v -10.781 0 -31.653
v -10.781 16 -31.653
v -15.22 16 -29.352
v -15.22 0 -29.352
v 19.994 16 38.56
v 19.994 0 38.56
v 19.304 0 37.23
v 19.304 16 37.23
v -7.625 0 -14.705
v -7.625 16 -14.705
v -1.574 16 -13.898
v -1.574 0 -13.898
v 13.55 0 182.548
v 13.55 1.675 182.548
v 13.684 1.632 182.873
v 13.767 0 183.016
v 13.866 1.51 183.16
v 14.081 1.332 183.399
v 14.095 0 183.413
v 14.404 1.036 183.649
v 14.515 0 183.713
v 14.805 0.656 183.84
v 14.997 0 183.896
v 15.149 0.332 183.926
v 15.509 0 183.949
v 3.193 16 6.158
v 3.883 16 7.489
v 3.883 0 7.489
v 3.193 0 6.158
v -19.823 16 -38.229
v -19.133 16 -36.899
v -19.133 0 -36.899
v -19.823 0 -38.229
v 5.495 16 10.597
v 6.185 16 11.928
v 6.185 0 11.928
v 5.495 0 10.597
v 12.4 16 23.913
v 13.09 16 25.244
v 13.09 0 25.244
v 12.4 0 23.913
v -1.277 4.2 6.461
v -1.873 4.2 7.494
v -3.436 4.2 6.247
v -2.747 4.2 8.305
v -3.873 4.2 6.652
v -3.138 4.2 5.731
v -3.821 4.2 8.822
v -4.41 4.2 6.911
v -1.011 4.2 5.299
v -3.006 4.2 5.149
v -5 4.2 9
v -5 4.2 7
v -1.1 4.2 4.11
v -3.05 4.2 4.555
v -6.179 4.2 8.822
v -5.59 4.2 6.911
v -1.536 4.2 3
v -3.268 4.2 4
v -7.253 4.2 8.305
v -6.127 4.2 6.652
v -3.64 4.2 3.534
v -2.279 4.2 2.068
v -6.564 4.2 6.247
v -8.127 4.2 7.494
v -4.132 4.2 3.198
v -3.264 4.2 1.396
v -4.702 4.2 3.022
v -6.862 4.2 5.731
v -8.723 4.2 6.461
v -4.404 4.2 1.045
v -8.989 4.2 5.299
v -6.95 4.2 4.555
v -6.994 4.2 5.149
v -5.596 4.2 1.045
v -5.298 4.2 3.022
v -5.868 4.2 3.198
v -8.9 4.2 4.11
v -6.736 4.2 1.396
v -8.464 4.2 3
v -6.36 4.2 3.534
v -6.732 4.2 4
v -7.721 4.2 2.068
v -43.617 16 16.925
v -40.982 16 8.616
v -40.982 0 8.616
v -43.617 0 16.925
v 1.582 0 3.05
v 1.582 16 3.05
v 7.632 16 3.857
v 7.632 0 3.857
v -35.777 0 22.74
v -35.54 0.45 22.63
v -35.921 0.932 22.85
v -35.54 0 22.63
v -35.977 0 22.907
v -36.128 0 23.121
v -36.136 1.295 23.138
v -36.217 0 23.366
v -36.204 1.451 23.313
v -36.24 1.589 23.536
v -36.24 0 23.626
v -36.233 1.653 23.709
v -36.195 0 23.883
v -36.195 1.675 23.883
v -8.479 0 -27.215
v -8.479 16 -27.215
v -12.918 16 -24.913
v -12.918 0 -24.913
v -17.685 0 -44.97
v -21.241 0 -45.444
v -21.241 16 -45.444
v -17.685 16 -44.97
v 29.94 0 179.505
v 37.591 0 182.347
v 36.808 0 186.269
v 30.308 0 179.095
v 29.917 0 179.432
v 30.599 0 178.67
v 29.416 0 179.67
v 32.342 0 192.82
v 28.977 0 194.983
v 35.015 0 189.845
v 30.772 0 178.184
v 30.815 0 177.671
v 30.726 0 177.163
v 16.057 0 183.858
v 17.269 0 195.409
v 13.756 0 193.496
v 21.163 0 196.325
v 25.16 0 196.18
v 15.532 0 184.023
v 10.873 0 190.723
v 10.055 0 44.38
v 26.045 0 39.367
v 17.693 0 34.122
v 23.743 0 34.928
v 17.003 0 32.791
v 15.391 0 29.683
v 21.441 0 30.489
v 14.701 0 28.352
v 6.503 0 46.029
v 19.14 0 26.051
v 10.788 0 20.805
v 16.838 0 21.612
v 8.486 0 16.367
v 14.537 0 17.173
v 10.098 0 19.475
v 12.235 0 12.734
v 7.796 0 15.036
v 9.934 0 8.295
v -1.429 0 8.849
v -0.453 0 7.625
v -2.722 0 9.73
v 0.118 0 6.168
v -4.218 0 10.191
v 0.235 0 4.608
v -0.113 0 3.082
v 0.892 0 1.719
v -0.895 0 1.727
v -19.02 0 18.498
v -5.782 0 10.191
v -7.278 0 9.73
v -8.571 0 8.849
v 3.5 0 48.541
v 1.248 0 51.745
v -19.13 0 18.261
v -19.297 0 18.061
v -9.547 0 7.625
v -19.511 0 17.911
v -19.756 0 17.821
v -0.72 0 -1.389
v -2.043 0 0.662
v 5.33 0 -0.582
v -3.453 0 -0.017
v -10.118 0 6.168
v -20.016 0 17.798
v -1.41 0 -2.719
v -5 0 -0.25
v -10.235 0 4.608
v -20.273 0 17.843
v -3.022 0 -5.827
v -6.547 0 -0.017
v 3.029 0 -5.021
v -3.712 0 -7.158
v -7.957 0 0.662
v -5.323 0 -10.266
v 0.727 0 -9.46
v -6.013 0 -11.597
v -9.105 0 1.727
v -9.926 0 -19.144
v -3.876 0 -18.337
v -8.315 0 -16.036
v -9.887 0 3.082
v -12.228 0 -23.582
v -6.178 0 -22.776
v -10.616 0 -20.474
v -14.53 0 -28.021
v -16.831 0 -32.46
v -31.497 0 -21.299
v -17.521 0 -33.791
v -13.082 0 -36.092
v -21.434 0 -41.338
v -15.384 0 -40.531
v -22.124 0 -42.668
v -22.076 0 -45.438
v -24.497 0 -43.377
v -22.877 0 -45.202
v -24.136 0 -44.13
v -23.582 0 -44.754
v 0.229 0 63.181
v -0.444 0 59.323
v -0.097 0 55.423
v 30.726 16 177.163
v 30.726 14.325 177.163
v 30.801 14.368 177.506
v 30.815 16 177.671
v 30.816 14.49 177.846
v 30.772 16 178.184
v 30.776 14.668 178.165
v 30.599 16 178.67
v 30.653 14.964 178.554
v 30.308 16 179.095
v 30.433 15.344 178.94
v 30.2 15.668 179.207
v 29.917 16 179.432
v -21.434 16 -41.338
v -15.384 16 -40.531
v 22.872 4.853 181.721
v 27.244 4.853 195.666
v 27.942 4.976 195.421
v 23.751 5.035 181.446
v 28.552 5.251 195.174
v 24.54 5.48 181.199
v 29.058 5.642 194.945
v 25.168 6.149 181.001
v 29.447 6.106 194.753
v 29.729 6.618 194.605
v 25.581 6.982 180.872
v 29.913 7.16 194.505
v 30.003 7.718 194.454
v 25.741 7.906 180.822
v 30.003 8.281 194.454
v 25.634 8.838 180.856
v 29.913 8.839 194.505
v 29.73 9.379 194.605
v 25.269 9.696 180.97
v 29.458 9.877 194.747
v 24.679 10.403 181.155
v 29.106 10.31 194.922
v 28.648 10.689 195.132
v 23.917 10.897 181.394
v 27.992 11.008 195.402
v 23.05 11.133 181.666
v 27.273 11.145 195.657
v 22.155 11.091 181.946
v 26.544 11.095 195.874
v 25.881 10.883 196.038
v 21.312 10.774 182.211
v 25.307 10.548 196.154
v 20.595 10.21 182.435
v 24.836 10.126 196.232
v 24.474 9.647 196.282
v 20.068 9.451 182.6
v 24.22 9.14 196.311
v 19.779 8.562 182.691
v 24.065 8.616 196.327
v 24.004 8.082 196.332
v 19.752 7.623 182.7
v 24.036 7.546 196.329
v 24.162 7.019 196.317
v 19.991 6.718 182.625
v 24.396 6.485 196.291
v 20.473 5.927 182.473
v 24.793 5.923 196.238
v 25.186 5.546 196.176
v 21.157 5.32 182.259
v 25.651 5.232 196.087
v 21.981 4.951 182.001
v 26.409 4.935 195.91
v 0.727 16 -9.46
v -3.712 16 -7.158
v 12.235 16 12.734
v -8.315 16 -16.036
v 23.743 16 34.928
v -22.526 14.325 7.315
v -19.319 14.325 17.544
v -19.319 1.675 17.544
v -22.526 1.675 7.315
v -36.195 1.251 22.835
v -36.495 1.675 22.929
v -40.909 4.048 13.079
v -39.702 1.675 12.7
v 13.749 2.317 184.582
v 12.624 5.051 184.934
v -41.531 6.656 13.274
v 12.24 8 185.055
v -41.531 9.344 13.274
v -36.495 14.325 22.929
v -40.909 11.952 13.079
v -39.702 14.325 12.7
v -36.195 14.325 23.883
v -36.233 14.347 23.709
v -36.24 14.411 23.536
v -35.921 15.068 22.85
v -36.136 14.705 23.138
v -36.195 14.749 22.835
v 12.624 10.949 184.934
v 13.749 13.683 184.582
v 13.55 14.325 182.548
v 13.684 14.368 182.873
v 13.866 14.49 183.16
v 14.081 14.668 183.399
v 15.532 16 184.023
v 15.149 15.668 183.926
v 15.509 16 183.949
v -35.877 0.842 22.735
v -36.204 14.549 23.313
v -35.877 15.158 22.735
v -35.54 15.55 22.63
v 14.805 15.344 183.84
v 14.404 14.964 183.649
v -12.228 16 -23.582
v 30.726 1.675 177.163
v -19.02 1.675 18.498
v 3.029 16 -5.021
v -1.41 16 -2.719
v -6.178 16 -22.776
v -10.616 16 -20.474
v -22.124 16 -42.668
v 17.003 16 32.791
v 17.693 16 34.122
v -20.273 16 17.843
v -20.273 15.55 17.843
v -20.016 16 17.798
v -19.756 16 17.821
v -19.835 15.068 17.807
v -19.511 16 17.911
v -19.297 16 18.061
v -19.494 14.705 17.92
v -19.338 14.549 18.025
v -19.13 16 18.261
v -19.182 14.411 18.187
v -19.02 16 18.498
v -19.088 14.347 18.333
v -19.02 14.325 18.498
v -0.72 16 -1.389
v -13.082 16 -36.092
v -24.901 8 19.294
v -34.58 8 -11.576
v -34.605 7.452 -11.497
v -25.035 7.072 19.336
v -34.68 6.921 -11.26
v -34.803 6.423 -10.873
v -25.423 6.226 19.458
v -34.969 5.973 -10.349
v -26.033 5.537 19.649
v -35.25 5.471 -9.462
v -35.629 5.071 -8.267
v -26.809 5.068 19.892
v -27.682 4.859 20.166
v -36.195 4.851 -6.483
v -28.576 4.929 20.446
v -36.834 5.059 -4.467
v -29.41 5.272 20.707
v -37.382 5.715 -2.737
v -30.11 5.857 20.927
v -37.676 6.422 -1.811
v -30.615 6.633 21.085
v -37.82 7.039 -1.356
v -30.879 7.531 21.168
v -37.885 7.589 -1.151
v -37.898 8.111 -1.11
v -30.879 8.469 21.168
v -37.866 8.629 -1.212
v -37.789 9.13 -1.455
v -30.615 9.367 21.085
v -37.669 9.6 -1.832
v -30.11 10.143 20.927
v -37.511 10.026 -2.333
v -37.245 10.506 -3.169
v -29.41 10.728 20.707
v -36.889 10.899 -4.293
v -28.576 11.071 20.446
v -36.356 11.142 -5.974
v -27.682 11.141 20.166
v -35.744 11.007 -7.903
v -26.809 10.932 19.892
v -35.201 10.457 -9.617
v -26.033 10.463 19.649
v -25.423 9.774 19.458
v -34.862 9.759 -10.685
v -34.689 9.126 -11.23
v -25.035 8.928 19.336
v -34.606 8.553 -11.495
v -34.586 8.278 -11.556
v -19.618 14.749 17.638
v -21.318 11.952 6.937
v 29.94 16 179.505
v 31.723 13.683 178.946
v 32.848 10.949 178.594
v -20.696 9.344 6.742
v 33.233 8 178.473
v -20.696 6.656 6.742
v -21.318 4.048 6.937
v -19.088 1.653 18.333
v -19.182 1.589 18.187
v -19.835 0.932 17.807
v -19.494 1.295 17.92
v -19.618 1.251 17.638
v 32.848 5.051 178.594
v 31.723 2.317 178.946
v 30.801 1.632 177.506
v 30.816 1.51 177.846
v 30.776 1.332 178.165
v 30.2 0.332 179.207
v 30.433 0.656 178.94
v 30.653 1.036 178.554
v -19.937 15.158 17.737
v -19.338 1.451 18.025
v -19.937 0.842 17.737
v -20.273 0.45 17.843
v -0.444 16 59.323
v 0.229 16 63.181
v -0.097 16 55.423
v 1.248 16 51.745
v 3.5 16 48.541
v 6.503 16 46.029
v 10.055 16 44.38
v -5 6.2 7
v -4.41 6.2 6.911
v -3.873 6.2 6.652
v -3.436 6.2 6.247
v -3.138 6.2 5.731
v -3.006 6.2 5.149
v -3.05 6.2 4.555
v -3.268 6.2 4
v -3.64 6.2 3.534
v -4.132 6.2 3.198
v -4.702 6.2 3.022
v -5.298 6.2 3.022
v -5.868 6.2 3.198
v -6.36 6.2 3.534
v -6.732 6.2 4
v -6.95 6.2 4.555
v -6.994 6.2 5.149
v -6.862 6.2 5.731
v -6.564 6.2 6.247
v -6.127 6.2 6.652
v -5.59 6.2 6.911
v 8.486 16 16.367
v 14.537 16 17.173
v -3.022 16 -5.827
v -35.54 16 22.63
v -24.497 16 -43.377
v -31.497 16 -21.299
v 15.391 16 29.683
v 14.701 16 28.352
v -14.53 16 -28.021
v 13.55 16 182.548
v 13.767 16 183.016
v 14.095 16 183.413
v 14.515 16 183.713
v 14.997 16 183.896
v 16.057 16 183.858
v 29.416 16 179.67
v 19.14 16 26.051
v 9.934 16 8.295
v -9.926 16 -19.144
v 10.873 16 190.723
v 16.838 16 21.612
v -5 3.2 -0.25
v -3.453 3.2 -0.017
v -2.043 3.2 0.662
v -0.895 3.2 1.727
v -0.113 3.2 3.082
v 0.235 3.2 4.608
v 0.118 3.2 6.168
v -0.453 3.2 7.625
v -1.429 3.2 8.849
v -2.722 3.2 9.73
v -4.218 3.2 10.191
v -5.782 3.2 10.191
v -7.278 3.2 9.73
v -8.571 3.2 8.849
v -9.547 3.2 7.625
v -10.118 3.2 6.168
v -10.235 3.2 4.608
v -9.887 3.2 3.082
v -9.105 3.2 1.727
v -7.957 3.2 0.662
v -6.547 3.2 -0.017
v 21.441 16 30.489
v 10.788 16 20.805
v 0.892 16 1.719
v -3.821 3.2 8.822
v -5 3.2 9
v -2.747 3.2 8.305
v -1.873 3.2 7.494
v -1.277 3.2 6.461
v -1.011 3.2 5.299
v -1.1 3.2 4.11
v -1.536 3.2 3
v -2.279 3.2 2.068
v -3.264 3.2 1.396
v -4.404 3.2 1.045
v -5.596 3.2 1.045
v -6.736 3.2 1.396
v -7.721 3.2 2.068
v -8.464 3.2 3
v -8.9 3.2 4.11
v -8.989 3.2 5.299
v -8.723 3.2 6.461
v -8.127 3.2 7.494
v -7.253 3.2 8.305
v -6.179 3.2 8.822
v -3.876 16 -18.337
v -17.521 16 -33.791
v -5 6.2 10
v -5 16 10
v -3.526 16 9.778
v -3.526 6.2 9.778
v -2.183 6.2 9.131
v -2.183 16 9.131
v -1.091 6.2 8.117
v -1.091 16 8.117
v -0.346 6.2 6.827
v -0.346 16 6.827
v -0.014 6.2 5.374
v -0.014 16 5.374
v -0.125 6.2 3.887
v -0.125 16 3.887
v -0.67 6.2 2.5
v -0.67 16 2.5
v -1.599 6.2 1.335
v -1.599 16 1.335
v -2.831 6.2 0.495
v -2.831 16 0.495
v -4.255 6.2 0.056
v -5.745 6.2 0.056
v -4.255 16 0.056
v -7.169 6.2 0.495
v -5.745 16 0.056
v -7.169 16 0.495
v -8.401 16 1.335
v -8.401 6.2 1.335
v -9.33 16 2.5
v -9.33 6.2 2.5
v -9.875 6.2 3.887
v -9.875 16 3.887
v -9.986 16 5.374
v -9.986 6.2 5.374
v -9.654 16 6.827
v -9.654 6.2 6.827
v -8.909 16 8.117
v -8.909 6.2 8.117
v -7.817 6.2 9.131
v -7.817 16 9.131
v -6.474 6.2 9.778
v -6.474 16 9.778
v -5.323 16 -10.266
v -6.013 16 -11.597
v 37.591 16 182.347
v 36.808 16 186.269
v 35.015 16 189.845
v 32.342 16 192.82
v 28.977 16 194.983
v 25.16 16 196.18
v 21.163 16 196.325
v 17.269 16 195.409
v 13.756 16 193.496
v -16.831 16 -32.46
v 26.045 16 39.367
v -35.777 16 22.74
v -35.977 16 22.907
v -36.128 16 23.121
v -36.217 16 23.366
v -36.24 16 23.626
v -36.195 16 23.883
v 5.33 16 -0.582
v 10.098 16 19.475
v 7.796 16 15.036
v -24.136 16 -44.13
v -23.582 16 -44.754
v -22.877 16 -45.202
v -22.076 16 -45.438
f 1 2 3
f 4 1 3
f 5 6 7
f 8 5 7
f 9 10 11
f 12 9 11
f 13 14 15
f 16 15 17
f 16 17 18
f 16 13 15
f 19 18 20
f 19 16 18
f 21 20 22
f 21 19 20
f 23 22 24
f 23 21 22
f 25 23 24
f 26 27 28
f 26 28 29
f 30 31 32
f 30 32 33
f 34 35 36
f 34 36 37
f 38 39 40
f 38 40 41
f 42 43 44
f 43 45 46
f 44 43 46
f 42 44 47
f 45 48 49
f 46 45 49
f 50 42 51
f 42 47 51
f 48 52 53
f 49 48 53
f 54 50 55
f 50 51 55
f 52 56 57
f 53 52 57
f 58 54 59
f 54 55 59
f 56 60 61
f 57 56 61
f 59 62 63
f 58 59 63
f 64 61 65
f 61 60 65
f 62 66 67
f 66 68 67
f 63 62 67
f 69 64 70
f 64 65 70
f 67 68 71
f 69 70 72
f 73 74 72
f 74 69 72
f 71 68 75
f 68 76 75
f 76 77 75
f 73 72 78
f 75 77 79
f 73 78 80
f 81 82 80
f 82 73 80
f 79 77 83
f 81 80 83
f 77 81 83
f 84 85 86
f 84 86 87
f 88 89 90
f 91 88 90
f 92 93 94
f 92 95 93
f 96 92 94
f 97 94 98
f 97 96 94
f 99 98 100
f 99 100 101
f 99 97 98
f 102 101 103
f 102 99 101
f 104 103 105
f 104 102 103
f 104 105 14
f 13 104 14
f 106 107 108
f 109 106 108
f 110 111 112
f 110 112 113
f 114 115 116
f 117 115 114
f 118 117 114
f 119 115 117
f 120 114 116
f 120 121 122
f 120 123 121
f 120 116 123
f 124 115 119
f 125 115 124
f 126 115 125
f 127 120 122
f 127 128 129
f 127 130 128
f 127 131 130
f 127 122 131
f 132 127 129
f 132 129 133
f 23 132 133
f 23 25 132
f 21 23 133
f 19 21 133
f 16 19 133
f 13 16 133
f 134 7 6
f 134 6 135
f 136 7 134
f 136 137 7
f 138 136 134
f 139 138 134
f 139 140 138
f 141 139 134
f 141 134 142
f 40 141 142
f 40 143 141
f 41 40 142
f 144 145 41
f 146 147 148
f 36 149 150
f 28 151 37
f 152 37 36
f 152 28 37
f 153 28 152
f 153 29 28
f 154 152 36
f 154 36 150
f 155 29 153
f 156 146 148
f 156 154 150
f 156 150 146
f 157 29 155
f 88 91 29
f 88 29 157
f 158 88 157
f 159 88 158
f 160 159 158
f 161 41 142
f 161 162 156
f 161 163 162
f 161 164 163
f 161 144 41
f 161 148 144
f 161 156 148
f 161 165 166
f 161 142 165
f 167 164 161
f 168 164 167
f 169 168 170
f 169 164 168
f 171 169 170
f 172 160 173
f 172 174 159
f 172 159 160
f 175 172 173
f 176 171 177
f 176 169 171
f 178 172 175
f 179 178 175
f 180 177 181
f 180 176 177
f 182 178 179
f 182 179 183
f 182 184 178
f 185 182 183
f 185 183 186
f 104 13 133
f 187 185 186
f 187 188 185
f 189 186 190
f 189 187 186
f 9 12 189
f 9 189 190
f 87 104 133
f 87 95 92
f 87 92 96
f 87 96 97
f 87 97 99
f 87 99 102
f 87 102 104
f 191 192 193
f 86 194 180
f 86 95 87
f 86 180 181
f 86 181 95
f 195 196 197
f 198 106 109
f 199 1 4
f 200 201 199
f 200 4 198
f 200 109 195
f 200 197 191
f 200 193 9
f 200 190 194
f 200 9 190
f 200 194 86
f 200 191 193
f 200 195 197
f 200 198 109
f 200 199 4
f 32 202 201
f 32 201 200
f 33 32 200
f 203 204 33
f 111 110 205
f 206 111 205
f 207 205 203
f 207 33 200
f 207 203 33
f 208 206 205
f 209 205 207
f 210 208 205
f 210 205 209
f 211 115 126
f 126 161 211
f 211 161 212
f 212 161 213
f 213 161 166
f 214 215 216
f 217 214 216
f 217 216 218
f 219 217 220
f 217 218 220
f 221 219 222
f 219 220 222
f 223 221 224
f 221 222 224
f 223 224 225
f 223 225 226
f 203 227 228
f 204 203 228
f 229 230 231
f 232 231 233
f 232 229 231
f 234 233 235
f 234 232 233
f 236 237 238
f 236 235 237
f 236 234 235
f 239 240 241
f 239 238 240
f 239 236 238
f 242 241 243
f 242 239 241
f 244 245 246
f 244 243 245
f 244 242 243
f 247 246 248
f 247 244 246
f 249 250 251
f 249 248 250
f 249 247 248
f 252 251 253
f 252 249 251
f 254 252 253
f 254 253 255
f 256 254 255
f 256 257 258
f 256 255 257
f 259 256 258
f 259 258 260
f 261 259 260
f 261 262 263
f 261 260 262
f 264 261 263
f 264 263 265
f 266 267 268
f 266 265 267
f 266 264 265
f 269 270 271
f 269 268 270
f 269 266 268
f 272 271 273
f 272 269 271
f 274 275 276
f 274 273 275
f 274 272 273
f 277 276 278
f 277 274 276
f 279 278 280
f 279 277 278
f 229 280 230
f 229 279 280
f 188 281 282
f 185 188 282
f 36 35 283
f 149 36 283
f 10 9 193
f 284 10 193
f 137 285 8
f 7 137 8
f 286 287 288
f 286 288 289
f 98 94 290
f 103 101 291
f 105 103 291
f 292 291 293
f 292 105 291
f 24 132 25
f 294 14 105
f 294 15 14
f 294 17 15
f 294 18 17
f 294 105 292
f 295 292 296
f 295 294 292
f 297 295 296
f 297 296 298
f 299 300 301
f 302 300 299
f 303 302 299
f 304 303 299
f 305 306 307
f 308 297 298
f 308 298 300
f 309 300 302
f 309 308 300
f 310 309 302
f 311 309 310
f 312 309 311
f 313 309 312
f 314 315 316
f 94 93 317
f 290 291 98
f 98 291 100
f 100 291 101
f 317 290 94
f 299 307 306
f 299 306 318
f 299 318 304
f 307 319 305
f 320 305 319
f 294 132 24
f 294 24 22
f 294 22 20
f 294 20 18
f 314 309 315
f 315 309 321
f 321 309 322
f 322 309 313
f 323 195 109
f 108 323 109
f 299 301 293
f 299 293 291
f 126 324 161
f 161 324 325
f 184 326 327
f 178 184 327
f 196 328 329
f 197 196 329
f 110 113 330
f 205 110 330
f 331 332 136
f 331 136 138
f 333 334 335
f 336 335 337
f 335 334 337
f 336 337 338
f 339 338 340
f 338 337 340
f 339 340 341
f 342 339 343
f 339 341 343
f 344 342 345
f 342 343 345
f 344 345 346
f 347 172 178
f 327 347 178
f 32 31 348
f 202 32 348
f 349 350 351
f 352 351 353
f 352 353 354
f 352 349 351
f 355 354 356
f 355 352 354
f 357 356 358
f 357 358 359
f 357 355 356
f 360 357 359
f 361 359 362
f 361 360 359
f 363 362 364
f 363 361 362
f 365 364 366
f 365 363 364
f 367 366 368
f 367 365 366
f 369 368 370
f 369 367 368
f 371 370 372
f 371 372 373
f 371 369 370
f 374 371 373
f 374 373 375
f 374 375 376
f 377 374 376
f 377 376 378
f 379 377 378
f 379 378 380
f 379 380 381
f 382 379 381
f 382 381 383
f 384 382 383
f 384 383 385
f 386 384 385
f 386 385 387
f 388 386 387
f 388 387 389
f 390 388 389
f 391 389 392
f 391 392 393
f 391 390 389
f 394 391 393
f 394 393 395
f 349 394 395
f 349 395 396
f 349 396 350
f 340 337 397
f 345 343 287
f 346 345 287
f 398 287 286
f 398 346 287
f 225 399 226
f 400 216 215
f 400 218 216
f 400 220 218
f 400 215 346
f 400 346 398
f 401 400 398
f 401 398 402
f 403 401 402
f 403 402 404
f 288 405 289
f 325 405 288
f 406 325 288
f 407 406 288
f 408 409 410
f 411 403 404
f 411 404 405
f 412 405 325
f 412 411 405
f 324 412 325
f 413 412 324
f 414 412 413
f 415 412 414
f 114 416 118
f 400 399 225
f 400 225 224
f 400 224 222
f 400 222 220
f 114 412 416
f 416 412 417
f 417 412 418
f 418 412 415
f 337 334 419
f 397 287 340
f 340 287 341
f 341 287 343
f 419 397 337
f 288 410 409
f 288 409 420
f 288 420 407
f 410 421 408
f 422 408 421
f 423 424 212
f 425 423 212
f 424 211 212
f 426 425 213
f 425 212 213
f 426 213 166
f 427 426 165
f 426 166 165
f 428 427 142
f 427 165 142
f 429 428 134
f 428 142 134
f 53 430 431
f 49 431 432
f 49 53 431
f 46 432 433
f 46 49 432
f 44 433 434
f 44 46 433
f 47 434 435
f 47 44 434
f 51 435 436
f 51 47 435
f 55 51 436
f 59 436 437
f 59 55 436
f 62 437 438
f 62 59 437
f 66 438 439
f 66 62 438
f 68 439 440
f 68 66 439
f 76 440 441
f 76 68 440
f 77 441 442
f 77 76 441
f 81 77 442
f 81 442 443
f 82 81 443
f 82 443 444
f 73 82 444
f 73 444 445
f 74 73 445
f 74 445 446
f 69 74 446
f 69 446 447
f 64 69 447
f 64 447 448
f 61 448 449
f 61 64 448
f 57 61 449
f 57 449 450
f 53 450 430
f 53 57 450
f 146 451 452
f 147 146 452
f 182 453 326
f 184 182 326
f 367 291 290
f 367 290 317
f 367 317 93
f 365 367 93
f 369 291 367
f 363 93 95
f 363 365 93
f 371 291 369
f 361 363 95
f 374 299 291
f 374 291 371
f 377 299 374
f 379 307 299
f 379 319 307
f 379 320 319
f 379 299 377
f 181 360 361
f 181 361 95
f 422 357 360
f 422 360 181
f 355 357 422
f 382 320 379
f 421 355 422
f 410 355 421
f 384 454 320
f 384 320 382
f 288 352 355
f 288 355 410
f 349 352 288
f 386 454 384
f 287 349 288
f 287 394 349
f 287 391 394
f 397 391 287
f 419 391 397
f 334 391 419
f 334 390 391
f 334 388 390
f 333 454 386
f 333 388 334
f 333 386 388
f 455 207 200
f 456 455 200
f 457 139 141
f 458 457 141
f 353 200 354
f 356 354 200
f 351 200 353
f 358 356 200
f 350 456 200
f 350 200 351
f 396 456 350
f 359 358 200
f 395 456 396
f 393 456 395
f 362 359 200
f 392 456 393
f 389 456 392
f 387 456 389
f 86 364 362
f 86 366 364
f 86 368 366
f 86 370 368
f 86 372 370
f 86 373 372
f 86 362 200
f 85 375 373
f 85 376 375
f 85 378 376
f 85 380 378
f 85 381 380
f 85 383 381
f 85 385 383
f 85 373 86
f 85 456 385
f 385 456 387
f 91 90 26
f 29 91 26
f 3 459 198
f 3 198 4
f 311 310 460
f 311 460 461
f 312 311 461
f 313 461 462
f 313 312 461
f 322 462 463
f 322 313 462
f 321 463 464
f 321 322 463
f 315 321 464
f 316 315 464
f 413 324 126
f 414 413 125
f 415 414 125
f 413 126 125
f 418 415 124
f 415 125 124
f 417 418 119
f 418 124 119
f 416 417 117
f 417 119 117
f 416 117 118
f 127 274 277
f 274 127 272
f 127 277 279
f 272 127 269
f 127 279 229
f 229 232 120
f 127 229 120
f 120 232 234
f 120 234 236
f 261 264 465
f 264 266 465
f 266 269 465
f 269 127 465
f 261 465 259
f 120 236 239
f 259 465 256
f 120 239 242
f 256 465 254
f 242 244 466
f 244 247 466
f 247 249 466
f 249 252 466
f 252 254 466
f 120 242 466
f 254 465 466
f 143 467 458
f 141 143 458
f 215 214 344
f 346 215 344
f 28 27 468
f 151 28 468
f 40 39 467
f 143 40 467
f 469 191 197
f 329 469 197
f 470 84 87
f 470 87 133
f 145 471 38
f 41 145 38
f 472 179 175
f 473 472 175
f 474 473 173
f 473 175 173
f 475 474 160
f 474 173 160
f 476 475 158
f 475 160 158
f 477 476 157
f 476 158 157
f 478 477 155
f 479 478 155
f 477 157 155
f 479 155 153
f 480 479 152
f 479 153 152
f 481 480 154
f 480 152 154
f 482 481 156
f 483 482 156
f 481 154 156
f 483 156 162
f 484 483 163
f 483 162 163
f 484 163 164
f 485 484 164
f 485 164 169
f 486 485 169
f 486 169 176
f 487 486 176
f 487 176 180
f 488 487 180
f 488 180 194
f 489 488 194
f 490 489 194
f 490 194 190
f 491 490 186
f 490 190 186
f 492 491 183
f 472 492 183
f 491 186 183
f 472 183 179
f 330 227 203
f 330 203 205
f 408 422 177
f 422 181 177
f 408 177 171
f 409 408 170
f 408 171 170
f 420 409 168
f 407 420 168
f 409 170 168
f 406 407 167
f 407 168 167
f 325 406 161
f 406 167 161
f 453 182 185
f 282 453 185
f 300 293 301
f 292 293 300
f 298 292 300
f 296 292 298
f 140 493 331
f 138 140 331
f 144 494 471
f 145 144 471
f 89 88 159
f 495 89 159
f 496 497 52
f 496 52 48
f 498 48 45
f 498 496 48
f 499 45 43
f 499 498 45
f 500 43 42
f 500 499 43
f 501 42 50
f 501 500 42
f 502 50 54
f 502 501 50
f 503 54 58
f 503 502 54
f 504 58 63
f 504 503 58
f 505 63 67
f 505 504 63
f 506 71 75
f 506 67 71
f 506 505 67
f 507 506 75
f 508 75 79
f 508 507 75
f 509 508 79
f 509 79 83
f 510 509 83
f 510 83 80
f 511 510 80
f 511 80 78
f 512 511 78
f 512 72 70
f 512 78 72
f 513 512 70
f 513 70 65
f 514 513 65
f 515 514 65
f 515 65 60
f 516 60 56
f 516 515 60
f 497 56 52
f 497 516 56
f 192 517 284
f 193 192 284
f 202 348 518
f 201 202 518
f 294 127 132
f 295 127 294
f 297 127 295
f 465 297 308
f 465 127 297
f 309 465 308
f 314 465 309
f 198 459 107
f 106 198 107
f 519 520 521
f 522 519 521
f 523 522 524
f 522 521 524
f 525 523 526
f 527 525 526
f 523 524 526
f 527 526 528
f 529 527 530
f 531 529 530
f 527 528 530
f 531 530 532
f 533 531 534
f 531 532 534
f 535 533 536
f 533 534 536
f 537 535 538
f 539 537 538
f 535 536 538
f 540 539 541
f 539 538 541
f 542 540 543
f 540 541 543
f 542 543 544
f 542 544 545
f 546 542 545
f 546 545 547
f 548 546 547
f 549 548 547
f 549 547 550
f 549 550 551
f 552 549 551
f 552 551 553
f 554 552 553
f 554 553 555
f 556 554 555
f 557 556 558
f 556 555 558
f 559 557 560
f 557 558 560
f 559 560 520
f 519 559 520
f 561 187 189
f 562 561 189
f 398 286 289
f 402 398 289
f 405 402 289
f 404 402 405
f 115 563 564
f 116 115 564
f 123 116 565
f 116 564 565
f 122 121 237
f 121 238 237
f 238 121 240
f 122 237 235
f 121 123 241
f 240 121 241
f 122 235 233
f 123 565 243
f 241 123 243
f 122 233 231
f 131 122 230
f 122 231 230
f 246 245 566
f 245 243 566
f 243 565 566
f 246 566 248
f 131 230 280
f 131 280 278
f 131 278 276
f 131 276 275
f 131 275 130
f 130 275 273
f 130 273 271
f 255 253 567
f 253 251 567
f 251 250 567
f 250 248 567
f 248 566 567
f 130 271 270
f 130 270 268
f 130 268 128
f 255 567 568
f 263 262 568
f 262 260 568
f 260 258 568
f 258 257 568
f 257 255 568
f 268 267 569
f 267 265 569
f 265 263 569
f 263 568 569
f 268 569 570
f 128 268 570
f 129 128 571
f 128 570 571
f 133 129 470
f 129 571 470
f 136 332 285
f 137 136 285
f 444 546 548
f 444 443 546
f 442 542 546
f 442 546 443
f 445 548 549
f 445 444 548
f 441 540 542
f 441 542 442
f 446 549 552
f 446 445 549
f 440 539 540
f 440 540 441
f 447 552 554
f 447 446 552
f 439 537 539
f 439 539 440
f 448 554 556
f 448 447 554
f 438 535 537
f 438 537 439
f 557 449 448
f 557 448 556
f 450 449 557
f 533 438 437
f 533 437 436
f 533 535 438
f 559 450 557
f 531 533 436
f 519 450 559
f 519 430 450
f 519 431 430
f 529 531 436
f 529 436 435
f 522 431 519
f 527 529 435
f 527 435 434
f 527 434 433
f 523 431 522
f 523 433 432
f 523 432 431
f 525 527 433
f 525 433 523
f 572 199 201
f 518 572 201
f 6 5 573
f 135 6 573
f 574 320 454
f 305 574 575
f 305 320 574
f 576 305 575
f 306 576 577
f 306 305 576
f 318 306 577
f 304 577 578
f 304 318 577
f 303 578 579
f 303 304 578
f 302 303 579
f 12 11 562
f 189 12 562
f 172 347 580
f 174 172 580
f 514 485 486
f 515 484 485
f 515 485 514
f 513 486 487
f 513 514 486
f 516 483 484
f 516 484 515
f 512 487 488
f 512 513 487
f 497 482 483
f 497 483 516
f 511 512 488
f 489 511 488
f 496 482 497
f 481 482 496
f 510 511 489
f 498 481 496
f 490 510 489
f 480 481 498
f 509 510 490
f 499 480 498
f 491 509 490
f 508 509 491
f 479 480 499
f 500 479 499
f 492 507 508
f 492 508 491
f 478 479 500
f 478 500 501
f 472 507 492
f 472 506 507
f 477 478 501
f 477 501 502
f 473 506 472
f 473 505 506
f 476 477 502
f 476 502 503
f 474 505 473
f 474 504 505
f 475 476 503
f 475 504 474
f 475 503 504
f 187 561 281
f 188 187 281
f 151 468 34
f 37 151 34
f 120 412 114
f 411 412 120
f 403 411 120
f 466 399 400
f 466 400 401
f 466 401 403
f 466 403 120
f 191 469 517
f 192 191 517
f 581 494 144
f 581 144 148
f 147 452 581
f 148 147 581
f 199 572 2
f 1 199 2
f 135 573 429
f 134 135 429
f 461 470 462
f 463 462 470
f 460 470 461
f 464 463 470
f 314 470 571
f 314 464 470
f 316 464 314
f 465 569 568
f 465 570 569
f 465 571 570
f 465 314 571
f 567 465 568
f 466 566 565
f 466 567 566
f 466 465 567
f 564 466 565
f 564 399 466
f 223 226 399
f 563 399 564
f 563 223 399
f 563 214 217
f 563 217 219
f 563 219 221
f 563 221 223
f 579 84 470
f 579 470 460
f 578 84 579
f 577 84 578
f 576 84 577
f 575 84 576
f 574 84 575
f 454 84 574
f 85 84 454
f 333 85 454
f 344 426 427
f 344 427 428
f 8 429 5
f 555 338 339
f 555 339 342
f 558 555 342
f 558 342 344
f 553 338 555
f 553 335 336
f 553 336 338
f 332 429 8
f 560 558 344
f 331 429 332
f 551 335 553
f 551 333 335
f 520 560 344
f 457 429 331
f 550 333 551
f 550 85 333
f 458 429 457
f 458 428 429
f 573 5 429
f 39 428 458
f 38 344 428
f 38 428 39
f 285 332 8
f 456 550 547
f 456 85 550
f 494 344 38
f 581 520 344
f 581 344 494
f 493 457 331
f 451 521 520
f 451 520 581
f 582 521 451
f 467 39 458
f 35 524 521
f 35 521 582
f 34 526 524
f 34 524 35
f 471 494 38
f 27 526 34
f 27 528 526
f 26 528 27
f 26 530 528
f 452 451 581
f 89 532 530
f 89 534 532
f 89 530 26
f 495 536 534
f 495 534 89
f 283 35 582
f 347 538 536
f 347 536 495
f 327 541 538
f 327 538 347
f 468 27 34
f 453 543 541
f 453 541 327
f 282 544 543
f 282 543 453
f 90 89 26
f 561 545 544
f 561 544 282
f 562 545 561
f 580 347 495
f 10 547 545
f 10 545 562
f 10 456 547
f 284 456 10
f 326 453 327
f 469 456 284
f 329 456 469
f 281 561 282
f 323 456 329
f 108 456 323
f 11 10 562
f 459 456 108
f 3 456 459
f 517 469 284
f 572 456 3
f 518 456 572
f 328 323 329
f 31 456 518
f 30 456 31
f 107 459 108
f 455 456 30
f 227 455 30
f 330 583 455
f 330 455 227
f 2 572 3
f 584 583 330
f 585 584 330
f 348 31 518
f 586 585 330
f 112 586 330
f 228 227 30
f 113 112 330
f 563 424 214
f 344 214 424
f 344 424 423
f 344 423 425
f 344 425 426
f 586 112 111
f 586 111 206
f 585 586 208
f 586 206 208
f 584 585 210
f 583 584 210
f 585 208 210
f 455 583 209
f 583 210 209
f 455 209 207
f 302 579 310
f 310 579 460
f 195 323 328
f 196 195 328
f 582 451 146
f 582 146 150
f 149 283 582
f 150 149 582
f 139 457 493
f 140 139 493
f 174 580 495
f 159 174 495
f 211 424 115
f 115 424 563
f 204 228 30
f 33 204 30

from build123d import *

# Parameters (mm, degrees)
SKETCH1_R                = 4
BOSS_EXTRUDE1_DEPTH      = 16
CUT_EXTRUDE2_DEPTH       = 243.712011885
FILLET2_R                = 50
FILLET3_R                = 5
BOSS_EXTRUDE2_DEPTH      = 16
LPATTERN1_COUNT          = 58
LPATTERN1_PITCH          = 5
SKETCH6_R                = 5.25
CUT_EXTRUDE4_DEPTH       = 3.2
BOSS_EXTRUDE3_START      = -11.8
SKETCH8_R                = 4
SKETCH8_R_2              = 2
BOSS_EXTRUDE3_DEPTH      = 11.8
SKETCH9_R                = 5
CUT_EXTRUDE7_DEPTH       = 9.8
BOSS_EXTRUDE4_DEPTH      = 16
CUT_EXTRUDE8_DEPTH       = 330.19878797
CUT_EXTRUDE8_DEPTH_BACK  = 330.19878797
SKETCH10_R               = 3.15
CUT_EXTRUDE9_DEPTH       = 230.693221824
CUT_EXTRUDE10_DEPTH      = 230.693221824
CUT_EXTRUDE13_DEPTH      = 228.62792195
FILLET6_R                = 15
FILLET7_R                = 2
SKETCH18_R               = 11
CUT_EXTRUDE14_DEPTH      = 180
CUT_EXTRUDE15_DEPTH      = 211.145198264
CUT_EXTRUDE15_DEPTH_BACK = 211.145198264
BOSS_EXTRUDE5_REACH      = 203.817
FILLET8_R                = 1
FILLET9_R                = 3
CUT_EXTRUDE16_DEPTH      = 239.866298177
CUT_EXTRUDE16_DEPTH_BACK = 239.866298177
SKETCH21_R               = 3.15


with BuildPart() as part:
    # Sketch1 → Boss-Extrude1 (new body)
    with BuildSketch(Plane(origin=(0, 0, 0), x_dir=(1, 0, 0), z_dir=(0, 1, 0))):
        Polygon((0, 0), (-70, 135), (-70, -15), (-70, -215), (111.481481481, -215), align=None)
        with Locations(Location((-5, -5, 0), (0, 0, 270))):
            Circle(SKETCH1_R, mode=Mode.SUBTRACT)
    extrude(amount=BOSS_EXTRUDE1_DEPTH)

    # Sketch3 → Cut-Extrude2 (cut, through all)
    with BuildSketch(Plane(origin=(0, 16, 0), x_dir=(1, 0, 0), z_dir=(0, 1, 0))):
        Polygon((-52.442610269, 88.104828667), (-69.618224346, 82.719823463), (14.148523277, -184.456395525), (31.324137355, -179.07139032), align=None)
    extrude(amount=-CUT_EXTRUDE2_DEPTH, mode=Mode.SUBTRACT)

    # Fillet2
    fillet2_edges = [part.edges().sort_by_distance(p)[0] for p in [
        (111.481481481, 8, 215),
        (-70, 8, 215),
    ]]
    fillet(fillet2_edges, radius=FILLET2_R)

    # Fillet3
    fillet3_edges = [part.edges().sort_by_distance(p)[0] for p in [
        (-70, 8, -135),
    ]]
    fillet(fillet3_edges, radius=FILLET3_R)

    # Sketch4 → Boss-Extrude2 (add)
    with BuildSketch(Plane(origin=(0, 16, 0), x_dir=(1, 0, 0), z_dir=(0, 1, 0))):
        Polygon((-60.561227343, 116.796652732), (-54.510866943, 115.99017648), (-58.9496396, 113.688590657), align=None)
    boss_extrude2 = extrude(amount=-BOSS_EXTRUDE2_DEPTH)

    # LPattern1: Boss-Extrude2 ×58
    with Locations(*[Vector(0.46031716445500054, 0, 0.8877545314489294) * (i * LPATTERN1_PITCH) for i in range(1, LPATTERN1_COUNT)]):
        add(boss_extrude2)

    # Sketch6 → Cut-Extrude4 (cut)
    with BuildSketch(Plane.XZ):
        with Locations(Location((-5, 5, 0), (0, 0, 270))):
            Circle(SKETCH6_R)
    extrude(amount=-CUT_EXTRUDE4_DEPTH, mode=Mode.SUBTRACT)

    # Sketch8 → Boss-Extrude3 (add)
    with BuildSketch(Plane(origin=(0, 16, 0), x_dir=(1, 0, 0), z_dir=(0, 1, 0)).offset(BOSS_EXTRUDE3_START)):
        with Locations(Location((-5, -5, 0), (0, 0, 90))):
            Circle(SKETCH8_R)
        with Locations(Location((-5, -5, 0), (0, 0, 270))):
            Circle(SKETCH8_R_2, mode=Mode.SUBTRACT)
    extrude(amount=BOSS_EXTRUDE3_DEPTH)

    # Sketch9 → Cut-Extrude7 (cut)
    with BuildSketch(Plane(origin=(0, 16, 0), x_dir=(1, 0, 0), z_dir=(0, 1, 0))):
        with Locations(Location((-5, -5, 0), (0, 0, 270))):
            Circle(SKETCH9_R)
    extrude(amount=-CUT_EXTRUDE7_DEPTH, mode=Mode.SUBTRACT)

    # Sketch12 → Boss-Extrude4 (add)
    with BuildSketch(Plane(origin=(0, 16, 0), x_dir=(1, 0, 0), z_dir=(0, 1, 0))):
        with BuildLine():
            Line((-70, 114.49506691), (-70, 54.49506691))
            ThreePointArc((-70, 54.49506691), (-73.030615433, 84.49506691), (-70, 114.49506691))
        make_face()
    extrude(amount=-BOSS_EXTRUDE4_DEPTH)

    # Sketch10 → Cut-Extrude8 (cut, two sides: drawn at the far end of the back side and taken through both)
    with BuildSketch(Plane(origin=(-29.844534263, 0, -95.189917814), x_dir=(0.954200782099043, 0, -0.29916695579822083), z_dir=(0.29916695579822083, 0, 0.954200782099043)).offset(-CUT_EXTRUDE8_DEPTH_BACK)):
        with Locations(Location((-32.68272635, 8, 0), (0, 0, 272.580314011))):
            Circle(SKETCH10_R)
    extrude(amount=CUT_EXTRUDE8_DEPTH + CUT_EXTRUDE8_DEPTH_BACK, mode=Mode.SUBTRACT)

    # Sketch13 → Cut-Extrude9 (cut, through all)
    with BuildSketch(Plane(origin=(0, 16, 0), x_dir=(1, 0, 0), z_dir=(0, 1, 0))):
        Polygon((-74.389228257, 81.223988684), (30.319206273, -252.746285051), (-65.100871937, -282.662980631), (-169.809306467, 51.307293104), align=None)
    extrude(amount=-CUT_EXTRUDE9_DEPTH, mode=Mode.SUBTRACT)

    # Sketch15 → Cut-Extrude10 (cut, through all)
    with BuildSketch(Plane(origin=(0, 16, 0), x_dir=(1, 0, 0), z_dir=(0, 1, 0))):
        Polygon((91.161899767, -18.950897803), (-4.258178443, -48.867593383), (70.533560507, -287.417788908), (165.953638717, -257.501093328), align=None)
    extrude(amount=-CUT_EXTRUDE10_DEPTH, mode=Mode.SUBTRACT)

    # Sketch16 → Cut-Extrude13 (cut, through all)
    with BuildSketch(Plane(origin=(0, 16, 0), x_dir=(1, 0, 0), z_dir=(0, 1, 0))):
        with BuildLine():
            Line((10.873354146, -190.723234214), (40.790049725, -286.143312424))
            Line((40.790049725, -286.143312424), (67.507671624, -277.766637662))
            Line((67.507671624, -277.766637662), (37.590976044, -182.346559452))
            ThreePointArc((37.590976044, -182.346559452), (27.10860607, -195.709380094), (10.873354146, -190.723234214))
        make_face()
    extrude(amount=-CUT_EXTRUDE13_DEPTH, mode=Mode.SUBTRACT)

    # Fillet6
    fillet6_edges = [part.edges().sort_by_distance(p)[0] for p in [
        (-4.258178443, 8, 48.867593383),
    ]]
    fillet(fillet6_edges, radius=FILLET6_R)

    # Fillet7
    fillet7_edges = [part.edges().sort_by_distance(p)[0] for p in [
        (-52.442610269, 8, -88.104828667),
        (31.324137355, 8, 179.07139032),
        (14.148523277, 8, 184.456395525),
        (-69.618224346, 8, -82.719823463),
    ]]
    fillet(fillet7_edges, radius=FILLET7_R)

    # Sketch18 → Cut-Extrude14 (cut)
    with BuildSketch(Plane(origin=(53.92221336, 0, 171.986301173), x_dir=(-0.9542007820990451, 0, 0.2991669557982141), z_dir=(-0.2991669557982141, 0, -0.9542007820990451))):
        with Locations((32.68272635, 8)):
            Circle(SKETCH18_R)
    extrude(amount=CUT_EXTRUDE14_DEPTH, mode=Mode.SUBTRACT)

    # Sketch19 → Cut-Extrude15 (cut, two sides: drawn at the far end of the back side and taken through both)
    with BuildSketch(Plane(origin=(0, 16, 0), x_dir=(1, 0, 0), z_dir=(0, 1, 0)).offset(-CUT_EXTRUDE15_DEPTH_BACK)):
        Polygon((-23.735854186, 45.776290217), (-43.616849953, -16.925311817), (-182.188010341, 92.887453174), (-34.776254673, 144.843881828), (-3.278660629, 45.963592539), align=None)
    extrude(amount=CUT_EXTRUDE15_DEPTH + CUT_EXTRUDE15_DEPTH_BACK, mode=Mode.SUBTRACT)

    # Boss-Extrude5: up to this face of the body (flat: up to its plane)
    boss_extrude5_end = Plane(part.part.faces().sort_by_distance((-3.292295487, 0, 60.867970257))[0])
    # Sketch20 → Boss-Extrude5 (add, up to the picked face)
    with BuildSketch(Plane(origin=(0, 16, 0), x_dir=(1, 0, 0), z_dir=(0, 1, 0)), mode=Mode.PRIVATE) as boss_extrude5_sk1:
        Polygon((-31.497089872, 21.298546901), (-40.982119501, -8.615777313), (-36.494615164, -22.928789044), (-19.319001086, -17.54378384), align=None)
    boss_extrude5_tool1 = split(extrude(boss_extrude5_sk1.sketch, amount=-BOSS_EXTRUDE5_REACH, mode=Mode.PRIVATE), bisect_by=boss_extrude5_end, keep=Keep.BOTH, mode=Mode.PRIVATE)
    add(boss_extrude5_tool1.solids().sort_by(Axis((-31.047961, 16, 5.590001), (0, -1, 0)))[0])

    # Fillet8
    fillet8_edges = [part.edges().sort_by_distance(p)[0] for p in [
        (-36.494615164, 15.16227766, 22.928789044),
        (-36.494615164, 0.83772234, 22.928789044),
        (-19.319001086, 0.83772234, 17.54378384),
        (-19.319001086, 15.16227766, 17.54378384),
    ]]
    fillet(fillet8_edges, radius=FILLET8_R)

    # Fillet9
    fillet9_edges = [part.edges().sort_by_distance(p)[0] for p in [
        (-23.735854186, 8, -45.776290217),
    ]]
    fillet(fillet9_edges, radius=FILLET9_R)

    # Sketch21 → Cut-Extrude16 (cut, two sides: drawn at the far end of the back side and taken through both)
    with BuildSketch(Plane(origin=(53.92221336, 0, 171.986301173), x_dir=(-0.9542007820990451, 0, 0.2991669557982141), z_dir=(-0.2991669557982141, 0, -0.9542007820990451)).offset(-CUT_EXTRUDE16_DEPTH_BACK)):
        with Locations(Location((32.68272635, 8, 0), (0, 0, 180))):
            Circle(SKETCH21_R)
    extrude(amount=CUT_EXTRUDE16_DEPTH + CUT_EXTRUDE16_DEPTH_BACK, mode=Mode.SUBTRACT)


solid = part.part
